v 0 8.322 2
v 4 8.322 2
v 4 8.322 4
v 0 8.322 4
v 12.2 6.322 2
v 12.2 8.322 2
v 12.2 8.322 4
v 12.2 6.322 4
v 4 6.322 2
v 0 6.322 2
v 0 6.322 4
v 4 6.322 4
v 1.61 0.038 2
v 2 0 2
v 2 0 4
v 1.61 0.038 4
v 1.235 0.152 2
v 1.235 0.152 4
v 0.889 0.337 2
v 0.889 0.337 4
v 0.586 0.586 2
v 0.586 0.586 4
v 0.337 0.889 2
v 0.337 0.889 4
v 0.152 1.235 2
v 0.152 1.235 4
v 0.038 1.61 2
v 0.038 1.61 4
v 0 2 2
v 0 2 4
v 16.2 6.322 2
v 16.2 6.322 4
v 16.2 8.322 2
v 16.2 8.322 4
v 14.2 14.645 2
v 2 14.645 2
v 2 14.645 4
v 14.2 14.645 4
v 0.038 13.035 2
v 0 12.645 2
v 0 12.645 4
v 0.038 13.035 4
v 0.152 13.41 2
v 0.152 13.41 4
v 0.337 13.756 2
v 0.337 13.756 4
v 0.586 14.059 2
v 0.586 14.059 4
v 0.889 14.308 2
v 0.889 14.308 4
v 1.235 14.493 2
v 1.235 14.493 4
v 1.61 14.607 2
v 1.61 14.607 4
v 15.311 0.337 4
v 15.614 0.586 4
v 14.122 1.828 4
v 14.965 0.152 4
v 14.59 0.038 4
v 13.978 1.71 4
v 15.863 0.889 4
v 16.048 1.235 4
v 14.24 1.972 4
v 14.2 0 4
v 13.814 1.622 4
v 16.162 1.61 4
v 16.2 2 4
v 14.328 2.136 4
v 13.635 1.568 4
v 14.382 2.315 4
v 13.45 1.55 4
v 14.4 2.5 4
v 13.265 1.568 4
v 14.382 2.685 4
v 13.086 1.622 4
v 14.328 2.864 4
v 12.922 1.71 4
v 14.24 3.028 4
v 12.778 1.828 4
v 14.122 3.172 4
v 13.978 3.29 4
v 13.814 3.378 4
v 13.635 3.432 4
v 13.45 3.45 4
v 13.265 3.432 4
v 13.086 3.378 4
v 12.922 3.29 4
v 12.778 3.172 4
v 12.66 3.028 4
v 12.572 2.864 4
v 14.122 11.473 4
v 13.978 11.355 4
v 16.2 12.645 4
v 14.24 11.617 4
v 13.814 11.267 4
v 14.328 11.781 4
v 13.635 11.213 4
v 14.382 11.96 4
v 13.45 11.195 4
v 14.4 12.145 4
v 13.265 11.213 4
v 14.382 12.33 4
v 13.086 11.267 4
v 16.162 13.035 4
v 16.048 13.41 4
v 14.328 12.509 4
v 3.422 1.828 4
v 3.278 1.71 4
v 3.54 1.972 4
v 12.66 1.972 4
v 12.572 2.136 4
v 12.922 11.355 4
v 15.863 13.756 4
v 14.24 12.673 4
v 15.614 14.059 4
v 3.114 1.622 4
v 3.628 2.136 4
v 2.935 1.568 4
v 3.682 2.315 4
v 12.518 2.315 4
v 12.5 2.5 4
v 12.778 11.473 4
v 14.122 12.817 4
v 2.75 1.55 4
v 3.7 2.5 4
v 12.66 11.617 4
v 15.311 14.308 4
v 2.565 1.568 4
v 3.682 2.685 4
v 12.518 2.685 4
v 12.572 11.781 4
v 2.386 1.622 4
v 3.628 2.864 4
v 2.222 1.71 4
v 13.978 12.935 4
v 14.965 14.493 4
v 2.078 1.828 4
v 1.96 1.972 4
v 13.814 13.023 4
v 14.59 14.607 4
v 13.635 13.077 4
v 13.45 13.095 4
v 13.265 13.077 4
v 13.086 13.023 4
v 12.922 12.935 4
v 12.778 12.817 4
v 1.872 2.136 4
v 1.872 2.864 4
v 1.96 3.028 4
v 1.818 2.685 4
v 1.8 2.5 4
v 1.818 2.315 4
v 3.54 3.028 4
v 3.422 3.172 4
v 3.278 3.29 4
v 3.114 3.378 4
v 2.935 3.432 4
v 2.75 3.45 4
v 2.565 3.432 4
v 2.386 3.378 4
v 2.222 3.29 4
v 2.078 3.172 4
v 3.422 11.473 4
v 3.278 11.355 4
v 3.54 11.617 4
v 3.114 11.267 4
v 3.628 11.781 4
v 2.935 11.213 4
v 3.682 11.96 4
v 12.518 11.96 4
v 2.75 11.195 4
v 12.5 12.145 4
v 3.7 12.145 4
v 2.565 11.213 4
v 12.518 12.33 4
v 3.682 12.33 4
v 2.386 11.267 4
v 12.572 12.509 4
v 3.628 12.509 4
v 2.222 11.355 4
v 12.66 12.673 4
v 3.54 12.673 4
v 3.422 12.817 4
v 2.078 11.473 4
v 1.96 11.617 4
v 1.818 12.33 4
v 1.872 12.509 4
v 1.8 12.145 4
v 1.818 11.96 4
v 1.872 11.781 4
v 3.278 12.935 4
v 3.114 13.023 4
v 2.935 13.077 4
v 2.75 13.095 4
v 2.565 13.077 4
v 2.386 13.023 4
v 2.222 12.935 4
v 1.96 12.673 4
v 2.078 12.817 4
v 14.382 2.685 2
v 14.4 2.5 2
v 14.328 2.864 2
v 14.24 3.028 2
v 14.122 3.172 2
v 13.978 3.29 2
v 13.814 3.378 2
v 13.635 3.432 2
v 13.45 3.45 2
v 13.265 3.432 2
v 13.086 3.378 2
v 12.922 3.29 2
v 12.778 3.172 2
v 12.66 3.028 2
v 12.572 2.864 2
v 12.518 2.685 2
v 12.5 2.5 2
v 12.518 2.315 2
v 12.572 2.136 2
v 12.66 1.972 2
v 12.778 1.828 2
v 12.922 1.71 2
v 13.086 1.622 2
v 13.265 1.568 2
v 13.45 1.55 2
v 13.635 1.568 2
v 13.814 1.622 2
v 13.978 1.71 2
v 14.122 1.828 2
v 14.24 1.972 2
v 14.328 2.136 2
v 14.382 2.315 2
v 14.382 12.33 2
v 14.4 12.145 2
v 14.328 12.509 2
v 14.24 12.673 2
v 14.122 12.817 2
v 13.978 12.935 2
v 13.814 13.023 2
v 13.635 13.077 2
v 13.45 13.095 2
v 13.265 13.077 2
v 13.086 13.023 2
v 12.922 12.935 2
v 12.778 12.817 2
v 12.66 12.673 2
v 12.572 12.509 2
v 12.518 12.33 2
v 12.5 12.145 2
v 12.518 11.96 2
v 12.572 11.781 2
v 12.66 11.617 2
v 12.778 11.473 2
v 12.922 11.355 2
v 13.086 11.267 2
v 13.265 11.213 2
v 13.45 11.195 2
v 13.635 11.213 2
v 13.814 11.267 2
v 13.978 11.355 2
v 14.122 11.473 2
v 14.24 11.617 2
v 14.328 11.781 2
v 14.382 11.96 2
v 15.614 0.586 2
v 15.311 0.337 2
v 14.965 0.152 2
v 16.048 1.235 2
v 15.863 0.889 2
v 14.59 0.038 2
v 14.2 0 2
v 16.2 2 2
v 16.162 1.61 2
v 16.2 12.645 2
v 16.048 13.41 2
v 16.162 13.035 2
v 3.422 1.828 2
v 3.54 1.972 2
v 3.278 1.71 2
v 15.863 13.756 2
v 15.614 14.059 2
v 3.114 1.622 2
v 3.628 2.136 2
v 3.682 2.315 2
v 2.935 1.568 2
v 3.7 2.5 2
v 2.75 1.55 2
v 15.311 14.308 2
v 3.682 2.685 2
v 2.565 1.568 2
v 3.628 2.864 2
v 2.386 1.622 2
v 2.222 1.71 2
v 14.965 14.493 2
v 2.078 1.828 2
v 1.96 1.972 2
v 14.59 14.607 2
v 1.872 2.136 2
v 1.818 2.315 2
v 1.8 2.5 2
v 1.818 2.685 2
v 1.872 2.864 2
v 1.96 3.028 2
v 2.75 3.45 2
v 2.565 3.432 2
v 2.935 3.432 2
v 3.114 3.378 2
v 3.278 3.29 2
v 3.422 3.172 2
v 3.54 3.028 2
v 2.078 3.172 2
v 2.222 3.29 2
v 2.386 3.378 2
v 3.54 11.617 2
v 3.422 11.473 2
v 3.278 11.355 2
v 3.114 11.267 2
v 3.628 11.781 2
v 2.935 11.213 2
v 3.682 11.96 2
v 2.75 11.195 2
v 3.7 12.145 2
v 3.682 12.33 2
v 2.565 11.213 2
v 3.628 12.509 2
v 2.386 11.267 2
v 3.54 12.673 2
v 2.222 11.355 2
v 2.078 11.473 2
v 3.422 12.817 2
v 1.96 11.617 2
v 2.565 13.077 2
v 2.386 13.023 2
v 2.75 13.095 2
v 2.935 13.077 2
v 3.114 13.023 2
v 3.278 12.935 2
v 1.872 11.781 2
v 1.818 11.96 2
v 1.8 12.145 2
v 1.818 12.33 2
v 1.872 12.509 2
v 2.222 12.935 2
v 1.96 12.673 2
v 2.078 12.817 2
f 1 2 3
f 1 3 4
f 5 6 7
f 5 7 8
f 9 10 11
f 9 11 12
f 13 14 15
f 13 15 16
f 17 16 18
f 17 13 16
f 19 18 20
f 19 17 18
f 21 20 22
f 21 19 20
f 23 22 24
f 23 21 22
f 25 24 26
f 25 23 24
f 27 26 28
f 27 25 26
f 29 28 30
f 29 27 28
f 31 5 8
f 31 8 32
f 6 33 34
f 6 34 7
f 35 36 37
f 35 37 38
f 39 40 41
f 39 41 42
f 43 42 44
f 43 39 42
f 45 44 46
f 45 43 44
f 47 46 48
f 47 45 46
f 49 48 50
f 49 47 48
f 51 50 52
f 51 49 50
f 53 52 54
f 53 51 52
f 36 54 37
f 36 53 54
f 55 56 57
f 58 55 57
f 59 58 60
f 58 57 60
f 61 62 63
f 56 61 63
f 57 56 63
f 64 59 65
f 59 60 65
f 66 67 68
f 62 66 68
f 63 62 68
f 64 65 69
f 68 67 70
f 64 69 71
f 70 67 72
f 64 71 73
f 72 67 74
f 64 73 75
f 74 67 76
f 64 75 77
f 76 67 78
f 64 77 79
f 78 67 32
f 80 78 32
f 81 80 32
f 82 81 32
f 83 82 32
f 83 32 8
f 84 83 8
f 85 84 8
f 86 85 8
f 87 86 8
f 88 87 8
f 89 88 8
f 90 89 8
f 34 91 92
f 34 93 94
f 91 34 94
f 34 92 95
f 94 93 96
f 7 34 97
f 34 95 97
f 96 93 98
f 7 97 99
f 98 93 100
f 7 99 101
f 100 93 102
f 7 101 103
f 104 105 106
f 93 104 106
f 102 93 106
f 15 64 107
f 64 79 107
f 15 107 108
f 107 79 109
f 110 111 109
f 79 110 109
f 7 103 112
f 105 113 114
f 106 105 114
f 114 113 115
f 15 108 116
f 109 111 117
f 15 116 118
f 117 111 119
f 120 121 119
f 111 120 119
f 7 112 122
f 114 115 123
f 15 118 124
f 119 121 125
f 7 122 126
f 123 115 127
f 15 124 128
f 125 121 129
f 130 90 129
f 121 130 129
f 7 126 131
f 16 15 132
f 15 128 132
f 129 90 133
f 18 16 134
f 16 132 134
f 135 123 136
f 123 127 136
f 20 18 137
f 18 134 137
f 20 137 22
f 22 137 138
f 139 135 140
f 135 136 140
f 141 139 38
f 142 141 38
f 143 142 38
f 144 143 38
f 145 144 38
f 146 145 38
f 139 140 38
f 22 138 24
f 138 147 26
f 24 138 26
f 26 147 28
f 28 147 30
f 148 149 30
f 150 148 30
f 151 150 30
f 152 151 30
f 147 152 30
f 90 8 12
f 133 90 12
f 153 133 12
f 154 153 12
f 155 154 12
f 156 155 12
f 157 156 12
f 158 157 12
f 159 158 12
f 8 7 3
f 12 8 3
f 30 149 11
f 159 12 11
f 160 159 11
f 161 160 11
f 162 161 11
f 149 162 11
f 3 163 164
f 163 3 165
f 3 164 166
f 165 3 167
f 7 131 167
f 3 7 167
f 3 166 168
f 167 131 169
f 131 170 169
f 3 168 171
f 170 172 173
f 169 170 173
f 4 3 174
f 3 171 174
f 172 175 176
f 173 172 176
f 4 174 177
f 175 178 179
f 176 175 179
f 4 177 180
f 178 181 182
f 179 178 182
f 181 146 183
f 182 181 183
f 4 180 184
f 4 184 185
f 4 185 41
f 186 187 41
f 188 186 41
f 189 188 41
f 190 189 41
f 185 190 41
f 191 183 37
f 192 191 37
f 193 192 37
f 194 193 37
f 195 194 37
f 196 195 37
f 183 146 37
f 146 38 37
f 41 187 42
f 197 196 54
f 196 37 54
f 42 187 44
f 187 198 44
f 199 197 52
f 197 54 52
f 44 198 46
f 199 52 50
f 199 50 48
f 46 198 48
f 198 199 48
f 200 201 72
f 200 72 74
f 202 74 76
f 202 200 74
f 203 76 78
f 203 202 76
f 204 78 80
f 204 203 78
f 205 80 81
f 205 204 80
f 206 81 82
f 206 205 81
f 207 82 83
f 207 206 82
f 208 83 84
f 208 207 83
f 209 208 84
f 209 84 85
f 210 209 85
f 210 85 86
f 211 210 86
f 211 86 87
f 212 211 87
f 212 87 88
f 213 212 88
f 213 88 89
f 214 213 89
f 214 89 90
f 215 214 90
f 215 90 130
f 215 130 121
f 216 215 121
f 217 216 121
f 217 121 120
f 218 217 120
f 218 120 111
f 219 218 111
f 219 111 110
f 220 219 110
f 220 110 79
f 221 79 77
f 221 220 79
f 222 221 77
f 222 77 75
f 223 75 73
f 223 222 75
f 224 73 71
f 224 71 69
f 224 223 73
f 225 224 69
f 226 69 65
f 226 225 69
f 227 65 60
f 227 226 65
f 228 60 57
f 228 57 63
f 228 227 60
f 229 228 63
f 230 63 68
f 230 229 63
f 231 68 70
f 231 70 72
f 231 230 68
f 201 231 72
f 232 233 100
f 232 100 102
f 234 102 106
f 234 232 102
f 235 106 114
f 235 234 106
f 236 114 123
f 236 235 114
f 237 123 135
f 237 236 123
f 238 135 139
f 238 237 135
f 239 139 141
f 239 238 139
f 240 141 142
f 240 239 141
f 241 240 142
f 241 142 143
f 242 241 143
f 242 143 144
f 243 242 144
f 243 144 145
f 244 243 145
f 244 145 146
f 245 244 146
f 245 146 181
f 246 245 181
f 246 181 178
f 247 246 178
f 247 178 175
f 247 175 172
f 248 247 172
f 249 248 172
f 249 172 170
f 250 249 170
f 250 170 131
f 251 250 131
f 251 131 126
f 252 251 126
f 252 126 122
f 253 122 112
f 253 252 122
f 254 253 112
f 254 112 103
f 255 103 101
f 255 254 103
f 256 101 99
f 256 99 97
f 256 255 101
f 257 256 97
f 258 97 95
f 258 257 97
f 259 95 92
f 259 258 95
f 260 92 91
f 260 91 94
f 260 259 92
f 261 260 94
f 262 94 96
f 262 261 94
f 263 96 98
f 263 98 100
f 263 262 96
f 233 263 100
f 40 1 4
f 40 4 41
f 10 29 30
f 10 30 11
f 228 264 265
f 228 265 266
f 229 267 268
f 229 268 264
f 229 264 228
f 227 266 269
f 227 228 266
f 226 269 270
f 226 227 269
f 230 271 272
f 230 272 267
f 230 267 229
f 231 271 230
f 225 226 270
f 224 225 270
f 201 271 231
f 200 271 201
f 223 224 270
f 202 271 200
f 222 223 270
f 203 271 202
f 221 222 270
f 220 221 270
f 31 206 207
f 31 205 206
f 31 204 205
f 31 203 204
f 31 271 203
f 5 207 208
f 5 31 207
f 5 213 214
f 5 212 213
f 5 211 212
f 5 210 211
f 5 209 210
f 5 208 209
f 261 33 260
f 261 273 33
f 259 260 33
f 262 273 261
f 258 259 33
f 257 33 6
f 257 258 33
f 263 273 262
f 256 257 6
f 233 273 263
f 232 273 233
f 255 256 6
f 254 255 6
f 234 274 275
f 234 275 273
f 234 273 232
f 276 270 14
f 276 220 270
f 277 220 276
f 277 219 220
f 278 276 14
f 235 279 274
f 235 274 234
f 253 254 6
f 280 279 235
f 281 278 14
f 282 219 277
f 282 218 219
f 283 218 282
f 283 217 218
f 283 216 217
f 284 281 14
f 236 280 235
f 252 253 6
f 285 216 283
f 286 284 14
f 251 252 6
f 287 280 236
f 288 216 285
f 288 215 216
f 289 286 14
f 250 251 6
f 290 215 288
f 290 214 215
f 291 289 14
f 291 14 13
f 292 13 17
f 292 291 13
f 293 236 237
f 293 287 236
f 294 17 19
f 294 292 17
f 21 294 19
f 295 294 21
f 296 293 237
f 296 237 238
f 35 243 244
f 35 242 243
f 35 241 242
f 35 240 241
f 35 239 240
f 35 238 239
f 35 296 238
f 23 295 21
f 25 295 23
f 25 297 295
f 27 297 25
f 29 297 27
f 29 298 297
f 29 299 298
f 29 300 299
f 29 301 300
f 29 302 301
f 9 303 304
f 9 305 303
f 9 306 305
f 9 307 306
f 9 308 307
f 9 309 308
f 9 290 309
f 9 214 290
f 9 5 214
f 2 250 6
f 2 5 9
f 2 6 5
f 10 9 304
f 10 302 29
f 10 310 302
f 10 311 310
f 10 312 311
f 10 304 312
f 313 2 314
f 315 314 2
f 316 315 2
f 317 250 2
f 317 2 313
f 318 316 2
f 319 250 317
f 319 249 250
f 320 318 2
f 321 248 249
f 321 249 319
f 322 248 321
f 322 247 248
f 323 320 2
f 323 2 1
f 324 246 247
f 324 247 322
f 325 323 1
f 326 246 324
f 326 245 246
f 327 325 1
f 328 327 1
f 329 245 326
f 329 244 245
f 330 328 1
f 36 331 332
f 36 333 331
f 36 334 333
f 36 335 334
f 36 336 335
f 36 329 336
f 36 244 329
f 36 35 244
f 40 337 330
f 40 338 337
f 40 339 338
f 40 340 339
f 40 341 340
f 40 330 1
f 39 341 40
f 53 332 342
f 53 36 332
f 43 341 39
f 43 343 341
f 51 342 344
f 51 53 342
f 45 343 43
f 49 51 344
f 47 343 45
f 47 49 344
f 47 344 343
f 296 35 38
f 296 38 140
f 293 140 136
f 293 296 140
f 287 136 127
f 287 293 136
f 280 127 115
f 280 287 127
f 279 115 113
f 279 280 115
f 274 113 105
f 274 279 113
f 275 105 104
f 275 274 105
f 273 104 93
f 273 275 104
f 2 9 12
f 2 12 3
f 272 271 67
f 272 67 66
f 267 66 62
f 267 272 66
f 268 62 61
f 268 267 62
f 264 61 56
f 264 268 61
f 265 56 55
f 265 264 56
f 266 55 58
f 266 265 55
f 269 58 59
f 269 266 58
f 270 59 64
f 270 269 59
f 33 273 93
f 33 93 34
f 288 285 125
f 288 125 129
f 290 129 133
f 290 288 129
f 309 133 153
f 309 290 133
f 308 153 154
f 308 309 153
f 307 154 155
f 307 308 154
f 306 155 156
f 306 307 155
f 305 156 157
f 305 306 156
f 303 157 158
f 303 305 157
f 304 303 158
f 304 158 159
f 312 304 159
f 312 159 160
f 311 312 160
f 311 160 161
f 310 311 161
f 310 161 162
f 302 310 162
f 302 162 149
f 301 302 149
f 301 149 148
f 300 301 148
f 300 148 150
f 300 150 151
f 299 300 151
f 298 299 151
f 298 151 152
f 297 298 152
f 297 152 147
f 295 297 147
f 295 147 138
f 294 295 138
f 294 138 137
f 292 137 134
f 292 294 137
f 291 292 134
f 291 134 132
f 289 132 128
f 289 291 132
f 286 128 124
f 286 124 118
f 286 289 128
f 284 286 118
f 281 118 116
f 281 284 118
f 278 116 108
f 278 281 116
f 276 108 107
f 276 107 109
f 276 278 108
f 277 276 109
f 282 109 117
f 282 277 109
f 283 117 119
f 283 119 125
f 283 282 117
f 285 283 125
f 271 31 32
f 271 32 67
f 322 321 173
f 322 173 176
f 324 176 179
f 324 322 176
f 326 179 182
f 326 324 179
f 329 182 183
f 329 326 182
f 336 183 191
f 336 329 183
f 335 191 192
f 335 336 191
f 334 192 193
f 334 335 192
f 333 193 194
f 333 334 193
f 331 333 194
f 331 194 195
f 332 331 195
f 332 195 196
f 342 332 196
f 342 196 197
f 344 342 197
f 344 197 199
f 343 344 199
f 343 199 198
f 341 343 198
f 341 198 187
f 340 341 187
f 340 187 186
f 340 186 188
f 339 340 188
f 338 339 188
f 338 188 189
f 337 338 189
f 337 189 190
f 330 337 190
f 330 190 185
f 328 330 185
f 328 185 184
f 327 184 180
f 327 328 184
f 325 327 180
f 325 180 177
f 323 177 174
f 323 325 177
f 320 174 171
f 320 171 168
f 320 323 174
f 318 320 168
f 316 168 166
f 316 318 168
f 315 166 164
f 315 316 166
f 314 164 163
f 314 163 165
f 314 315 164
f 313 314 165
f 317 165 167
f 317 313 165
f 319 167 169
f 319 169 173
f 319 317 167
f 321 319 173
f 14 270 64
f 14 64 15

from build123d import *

# Parameters (mm, degrees)
SKETCH1_R           = 0.95
BOSS_EXTRUDE1_DEPTH = 4
SKETCH2_W           = 16.2
SKETCH2_H           = 14.645
CUT_EXTRUDE1_DEPTH  = 2


with BuildPart() as part:
    # Sketch1 → Boss-Extrude1 (new body)
    with BuildSketch(Plane.XY):
        with BuildLine():
            Line((2, 14.645), (14.2, 14.645))
            ThreePointArc((14.2, 14.645), (15.614213562, 14.059213562), (16.2, 12.645))
            Line((16.2, 12.645), (16.2, 8.3225))
            Line((16.2, 8.3225), (12.2, 8.3225))
            Line((12.2, 8.3225), (12.2, 6.3225))
            Line((12.2, 6.3225), (16.2, 6.3225))
            Line((16.2, 6.3225), (16.2, 2))
            ThreePointArc((16.2, 2), (15.614213562, 0.585786438), (14.2, 0))
            Line((14.2, 0), (2, 0))
            ThreePointArc((2, 0), (0.585786438, 0.585786438), (0, 2))
            Line((0, 2), (0, 6.3225))
            Line((0, 6.3225), (4, 6.3225))
            Line((4, 6.3225), (4, 8.3225))
            Line((4, 8.3225), (0, 8.3225))
            Line((0, 8.3225), (0, 12.645))
            ThreePointArc((0, 12.645), (0.585786438, 14.059213562), (2, 14.645))
        make_face()
        with Locations((2.75, 12.145)):
            Circle(SKETCH1_R, mode=Mode.SUBTRACT)
        with Locations((13.45, 2.5)):
            Circle(SKETCH1_R, mode=Mode.SUBTRACT)
        with Locations((13.45, 12.145)):
            Circle(SKETCH1_R, mode=Mode.SUBTRACT)
        with Locations((2.75, 2.5)):
            Circle(SKETCH1_R, mode=Mode.SUBTRACT)
    extrude(amount=BOSS_EXTRUDE1_DEPTH)

    # Sketch2 → Cut-Extrude1 (cut)
    with BuildSketch(Plane(origin=(0, 0, 0), x_dir=(-1, 0, 0), z_dir=(0, 0, -1))):
        with Locations((-8.1, 7.3225)):
            Rectangle(SKETCH2_W, SKETCH2_H)
    extrude(amount=-CUT_EXTRUDE1_DEPTH, mode=Mode.SUBTRACT)


solid = part.part
